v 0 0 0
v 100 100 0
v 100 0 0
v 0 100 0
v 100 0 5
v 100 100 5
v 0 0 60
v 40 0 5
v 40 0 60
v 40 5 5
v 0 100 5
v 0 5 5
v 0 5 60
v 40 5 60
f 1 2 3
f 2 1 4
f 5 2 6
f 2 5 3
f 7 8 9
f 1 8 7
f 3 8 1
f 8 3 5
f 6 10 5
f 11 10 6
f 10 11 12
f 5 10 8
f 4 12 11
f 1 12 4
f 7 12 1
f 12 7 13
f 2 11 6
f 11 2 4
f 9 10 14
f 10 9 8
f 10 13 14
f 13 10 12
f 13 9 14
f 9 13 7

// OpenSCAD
union() {
	union() {
		multmatrix(m = [[1.,0.,0.],
		 [0.,1.,0.],
		 [0.,0.,1.]]) {
			linear_extrude(height = 5) {
				union() {
					difference() {
						polygon(points = [[0.0000000000, 0.0000000000], [100.0000000000, 0.0000000000], [100.0000000000, 100.0000000000], [0.0000000000, 100.0000000000], [0.0000000000, 0.0000000000]]);
					}
				}
			}
		}
	}
	union() {
		multmatrix(m = [[ 1., 0., 0.],
		 [ 0., 0., 1.],
		 [-0.,-1.,-0.]]) {
			linear_extrude(height = 5) {
				union() {
					difference() {
						polygon(points = [[0.0000000000, 0.0000000000], [40.0000000000, 0.0000000000], [40.0000000000, -60.0000000000], [0.0000000000, -60.0000000000], [0.0000000000, 0.0000000000]]);
					}
				}
			}
		}
	}
}
